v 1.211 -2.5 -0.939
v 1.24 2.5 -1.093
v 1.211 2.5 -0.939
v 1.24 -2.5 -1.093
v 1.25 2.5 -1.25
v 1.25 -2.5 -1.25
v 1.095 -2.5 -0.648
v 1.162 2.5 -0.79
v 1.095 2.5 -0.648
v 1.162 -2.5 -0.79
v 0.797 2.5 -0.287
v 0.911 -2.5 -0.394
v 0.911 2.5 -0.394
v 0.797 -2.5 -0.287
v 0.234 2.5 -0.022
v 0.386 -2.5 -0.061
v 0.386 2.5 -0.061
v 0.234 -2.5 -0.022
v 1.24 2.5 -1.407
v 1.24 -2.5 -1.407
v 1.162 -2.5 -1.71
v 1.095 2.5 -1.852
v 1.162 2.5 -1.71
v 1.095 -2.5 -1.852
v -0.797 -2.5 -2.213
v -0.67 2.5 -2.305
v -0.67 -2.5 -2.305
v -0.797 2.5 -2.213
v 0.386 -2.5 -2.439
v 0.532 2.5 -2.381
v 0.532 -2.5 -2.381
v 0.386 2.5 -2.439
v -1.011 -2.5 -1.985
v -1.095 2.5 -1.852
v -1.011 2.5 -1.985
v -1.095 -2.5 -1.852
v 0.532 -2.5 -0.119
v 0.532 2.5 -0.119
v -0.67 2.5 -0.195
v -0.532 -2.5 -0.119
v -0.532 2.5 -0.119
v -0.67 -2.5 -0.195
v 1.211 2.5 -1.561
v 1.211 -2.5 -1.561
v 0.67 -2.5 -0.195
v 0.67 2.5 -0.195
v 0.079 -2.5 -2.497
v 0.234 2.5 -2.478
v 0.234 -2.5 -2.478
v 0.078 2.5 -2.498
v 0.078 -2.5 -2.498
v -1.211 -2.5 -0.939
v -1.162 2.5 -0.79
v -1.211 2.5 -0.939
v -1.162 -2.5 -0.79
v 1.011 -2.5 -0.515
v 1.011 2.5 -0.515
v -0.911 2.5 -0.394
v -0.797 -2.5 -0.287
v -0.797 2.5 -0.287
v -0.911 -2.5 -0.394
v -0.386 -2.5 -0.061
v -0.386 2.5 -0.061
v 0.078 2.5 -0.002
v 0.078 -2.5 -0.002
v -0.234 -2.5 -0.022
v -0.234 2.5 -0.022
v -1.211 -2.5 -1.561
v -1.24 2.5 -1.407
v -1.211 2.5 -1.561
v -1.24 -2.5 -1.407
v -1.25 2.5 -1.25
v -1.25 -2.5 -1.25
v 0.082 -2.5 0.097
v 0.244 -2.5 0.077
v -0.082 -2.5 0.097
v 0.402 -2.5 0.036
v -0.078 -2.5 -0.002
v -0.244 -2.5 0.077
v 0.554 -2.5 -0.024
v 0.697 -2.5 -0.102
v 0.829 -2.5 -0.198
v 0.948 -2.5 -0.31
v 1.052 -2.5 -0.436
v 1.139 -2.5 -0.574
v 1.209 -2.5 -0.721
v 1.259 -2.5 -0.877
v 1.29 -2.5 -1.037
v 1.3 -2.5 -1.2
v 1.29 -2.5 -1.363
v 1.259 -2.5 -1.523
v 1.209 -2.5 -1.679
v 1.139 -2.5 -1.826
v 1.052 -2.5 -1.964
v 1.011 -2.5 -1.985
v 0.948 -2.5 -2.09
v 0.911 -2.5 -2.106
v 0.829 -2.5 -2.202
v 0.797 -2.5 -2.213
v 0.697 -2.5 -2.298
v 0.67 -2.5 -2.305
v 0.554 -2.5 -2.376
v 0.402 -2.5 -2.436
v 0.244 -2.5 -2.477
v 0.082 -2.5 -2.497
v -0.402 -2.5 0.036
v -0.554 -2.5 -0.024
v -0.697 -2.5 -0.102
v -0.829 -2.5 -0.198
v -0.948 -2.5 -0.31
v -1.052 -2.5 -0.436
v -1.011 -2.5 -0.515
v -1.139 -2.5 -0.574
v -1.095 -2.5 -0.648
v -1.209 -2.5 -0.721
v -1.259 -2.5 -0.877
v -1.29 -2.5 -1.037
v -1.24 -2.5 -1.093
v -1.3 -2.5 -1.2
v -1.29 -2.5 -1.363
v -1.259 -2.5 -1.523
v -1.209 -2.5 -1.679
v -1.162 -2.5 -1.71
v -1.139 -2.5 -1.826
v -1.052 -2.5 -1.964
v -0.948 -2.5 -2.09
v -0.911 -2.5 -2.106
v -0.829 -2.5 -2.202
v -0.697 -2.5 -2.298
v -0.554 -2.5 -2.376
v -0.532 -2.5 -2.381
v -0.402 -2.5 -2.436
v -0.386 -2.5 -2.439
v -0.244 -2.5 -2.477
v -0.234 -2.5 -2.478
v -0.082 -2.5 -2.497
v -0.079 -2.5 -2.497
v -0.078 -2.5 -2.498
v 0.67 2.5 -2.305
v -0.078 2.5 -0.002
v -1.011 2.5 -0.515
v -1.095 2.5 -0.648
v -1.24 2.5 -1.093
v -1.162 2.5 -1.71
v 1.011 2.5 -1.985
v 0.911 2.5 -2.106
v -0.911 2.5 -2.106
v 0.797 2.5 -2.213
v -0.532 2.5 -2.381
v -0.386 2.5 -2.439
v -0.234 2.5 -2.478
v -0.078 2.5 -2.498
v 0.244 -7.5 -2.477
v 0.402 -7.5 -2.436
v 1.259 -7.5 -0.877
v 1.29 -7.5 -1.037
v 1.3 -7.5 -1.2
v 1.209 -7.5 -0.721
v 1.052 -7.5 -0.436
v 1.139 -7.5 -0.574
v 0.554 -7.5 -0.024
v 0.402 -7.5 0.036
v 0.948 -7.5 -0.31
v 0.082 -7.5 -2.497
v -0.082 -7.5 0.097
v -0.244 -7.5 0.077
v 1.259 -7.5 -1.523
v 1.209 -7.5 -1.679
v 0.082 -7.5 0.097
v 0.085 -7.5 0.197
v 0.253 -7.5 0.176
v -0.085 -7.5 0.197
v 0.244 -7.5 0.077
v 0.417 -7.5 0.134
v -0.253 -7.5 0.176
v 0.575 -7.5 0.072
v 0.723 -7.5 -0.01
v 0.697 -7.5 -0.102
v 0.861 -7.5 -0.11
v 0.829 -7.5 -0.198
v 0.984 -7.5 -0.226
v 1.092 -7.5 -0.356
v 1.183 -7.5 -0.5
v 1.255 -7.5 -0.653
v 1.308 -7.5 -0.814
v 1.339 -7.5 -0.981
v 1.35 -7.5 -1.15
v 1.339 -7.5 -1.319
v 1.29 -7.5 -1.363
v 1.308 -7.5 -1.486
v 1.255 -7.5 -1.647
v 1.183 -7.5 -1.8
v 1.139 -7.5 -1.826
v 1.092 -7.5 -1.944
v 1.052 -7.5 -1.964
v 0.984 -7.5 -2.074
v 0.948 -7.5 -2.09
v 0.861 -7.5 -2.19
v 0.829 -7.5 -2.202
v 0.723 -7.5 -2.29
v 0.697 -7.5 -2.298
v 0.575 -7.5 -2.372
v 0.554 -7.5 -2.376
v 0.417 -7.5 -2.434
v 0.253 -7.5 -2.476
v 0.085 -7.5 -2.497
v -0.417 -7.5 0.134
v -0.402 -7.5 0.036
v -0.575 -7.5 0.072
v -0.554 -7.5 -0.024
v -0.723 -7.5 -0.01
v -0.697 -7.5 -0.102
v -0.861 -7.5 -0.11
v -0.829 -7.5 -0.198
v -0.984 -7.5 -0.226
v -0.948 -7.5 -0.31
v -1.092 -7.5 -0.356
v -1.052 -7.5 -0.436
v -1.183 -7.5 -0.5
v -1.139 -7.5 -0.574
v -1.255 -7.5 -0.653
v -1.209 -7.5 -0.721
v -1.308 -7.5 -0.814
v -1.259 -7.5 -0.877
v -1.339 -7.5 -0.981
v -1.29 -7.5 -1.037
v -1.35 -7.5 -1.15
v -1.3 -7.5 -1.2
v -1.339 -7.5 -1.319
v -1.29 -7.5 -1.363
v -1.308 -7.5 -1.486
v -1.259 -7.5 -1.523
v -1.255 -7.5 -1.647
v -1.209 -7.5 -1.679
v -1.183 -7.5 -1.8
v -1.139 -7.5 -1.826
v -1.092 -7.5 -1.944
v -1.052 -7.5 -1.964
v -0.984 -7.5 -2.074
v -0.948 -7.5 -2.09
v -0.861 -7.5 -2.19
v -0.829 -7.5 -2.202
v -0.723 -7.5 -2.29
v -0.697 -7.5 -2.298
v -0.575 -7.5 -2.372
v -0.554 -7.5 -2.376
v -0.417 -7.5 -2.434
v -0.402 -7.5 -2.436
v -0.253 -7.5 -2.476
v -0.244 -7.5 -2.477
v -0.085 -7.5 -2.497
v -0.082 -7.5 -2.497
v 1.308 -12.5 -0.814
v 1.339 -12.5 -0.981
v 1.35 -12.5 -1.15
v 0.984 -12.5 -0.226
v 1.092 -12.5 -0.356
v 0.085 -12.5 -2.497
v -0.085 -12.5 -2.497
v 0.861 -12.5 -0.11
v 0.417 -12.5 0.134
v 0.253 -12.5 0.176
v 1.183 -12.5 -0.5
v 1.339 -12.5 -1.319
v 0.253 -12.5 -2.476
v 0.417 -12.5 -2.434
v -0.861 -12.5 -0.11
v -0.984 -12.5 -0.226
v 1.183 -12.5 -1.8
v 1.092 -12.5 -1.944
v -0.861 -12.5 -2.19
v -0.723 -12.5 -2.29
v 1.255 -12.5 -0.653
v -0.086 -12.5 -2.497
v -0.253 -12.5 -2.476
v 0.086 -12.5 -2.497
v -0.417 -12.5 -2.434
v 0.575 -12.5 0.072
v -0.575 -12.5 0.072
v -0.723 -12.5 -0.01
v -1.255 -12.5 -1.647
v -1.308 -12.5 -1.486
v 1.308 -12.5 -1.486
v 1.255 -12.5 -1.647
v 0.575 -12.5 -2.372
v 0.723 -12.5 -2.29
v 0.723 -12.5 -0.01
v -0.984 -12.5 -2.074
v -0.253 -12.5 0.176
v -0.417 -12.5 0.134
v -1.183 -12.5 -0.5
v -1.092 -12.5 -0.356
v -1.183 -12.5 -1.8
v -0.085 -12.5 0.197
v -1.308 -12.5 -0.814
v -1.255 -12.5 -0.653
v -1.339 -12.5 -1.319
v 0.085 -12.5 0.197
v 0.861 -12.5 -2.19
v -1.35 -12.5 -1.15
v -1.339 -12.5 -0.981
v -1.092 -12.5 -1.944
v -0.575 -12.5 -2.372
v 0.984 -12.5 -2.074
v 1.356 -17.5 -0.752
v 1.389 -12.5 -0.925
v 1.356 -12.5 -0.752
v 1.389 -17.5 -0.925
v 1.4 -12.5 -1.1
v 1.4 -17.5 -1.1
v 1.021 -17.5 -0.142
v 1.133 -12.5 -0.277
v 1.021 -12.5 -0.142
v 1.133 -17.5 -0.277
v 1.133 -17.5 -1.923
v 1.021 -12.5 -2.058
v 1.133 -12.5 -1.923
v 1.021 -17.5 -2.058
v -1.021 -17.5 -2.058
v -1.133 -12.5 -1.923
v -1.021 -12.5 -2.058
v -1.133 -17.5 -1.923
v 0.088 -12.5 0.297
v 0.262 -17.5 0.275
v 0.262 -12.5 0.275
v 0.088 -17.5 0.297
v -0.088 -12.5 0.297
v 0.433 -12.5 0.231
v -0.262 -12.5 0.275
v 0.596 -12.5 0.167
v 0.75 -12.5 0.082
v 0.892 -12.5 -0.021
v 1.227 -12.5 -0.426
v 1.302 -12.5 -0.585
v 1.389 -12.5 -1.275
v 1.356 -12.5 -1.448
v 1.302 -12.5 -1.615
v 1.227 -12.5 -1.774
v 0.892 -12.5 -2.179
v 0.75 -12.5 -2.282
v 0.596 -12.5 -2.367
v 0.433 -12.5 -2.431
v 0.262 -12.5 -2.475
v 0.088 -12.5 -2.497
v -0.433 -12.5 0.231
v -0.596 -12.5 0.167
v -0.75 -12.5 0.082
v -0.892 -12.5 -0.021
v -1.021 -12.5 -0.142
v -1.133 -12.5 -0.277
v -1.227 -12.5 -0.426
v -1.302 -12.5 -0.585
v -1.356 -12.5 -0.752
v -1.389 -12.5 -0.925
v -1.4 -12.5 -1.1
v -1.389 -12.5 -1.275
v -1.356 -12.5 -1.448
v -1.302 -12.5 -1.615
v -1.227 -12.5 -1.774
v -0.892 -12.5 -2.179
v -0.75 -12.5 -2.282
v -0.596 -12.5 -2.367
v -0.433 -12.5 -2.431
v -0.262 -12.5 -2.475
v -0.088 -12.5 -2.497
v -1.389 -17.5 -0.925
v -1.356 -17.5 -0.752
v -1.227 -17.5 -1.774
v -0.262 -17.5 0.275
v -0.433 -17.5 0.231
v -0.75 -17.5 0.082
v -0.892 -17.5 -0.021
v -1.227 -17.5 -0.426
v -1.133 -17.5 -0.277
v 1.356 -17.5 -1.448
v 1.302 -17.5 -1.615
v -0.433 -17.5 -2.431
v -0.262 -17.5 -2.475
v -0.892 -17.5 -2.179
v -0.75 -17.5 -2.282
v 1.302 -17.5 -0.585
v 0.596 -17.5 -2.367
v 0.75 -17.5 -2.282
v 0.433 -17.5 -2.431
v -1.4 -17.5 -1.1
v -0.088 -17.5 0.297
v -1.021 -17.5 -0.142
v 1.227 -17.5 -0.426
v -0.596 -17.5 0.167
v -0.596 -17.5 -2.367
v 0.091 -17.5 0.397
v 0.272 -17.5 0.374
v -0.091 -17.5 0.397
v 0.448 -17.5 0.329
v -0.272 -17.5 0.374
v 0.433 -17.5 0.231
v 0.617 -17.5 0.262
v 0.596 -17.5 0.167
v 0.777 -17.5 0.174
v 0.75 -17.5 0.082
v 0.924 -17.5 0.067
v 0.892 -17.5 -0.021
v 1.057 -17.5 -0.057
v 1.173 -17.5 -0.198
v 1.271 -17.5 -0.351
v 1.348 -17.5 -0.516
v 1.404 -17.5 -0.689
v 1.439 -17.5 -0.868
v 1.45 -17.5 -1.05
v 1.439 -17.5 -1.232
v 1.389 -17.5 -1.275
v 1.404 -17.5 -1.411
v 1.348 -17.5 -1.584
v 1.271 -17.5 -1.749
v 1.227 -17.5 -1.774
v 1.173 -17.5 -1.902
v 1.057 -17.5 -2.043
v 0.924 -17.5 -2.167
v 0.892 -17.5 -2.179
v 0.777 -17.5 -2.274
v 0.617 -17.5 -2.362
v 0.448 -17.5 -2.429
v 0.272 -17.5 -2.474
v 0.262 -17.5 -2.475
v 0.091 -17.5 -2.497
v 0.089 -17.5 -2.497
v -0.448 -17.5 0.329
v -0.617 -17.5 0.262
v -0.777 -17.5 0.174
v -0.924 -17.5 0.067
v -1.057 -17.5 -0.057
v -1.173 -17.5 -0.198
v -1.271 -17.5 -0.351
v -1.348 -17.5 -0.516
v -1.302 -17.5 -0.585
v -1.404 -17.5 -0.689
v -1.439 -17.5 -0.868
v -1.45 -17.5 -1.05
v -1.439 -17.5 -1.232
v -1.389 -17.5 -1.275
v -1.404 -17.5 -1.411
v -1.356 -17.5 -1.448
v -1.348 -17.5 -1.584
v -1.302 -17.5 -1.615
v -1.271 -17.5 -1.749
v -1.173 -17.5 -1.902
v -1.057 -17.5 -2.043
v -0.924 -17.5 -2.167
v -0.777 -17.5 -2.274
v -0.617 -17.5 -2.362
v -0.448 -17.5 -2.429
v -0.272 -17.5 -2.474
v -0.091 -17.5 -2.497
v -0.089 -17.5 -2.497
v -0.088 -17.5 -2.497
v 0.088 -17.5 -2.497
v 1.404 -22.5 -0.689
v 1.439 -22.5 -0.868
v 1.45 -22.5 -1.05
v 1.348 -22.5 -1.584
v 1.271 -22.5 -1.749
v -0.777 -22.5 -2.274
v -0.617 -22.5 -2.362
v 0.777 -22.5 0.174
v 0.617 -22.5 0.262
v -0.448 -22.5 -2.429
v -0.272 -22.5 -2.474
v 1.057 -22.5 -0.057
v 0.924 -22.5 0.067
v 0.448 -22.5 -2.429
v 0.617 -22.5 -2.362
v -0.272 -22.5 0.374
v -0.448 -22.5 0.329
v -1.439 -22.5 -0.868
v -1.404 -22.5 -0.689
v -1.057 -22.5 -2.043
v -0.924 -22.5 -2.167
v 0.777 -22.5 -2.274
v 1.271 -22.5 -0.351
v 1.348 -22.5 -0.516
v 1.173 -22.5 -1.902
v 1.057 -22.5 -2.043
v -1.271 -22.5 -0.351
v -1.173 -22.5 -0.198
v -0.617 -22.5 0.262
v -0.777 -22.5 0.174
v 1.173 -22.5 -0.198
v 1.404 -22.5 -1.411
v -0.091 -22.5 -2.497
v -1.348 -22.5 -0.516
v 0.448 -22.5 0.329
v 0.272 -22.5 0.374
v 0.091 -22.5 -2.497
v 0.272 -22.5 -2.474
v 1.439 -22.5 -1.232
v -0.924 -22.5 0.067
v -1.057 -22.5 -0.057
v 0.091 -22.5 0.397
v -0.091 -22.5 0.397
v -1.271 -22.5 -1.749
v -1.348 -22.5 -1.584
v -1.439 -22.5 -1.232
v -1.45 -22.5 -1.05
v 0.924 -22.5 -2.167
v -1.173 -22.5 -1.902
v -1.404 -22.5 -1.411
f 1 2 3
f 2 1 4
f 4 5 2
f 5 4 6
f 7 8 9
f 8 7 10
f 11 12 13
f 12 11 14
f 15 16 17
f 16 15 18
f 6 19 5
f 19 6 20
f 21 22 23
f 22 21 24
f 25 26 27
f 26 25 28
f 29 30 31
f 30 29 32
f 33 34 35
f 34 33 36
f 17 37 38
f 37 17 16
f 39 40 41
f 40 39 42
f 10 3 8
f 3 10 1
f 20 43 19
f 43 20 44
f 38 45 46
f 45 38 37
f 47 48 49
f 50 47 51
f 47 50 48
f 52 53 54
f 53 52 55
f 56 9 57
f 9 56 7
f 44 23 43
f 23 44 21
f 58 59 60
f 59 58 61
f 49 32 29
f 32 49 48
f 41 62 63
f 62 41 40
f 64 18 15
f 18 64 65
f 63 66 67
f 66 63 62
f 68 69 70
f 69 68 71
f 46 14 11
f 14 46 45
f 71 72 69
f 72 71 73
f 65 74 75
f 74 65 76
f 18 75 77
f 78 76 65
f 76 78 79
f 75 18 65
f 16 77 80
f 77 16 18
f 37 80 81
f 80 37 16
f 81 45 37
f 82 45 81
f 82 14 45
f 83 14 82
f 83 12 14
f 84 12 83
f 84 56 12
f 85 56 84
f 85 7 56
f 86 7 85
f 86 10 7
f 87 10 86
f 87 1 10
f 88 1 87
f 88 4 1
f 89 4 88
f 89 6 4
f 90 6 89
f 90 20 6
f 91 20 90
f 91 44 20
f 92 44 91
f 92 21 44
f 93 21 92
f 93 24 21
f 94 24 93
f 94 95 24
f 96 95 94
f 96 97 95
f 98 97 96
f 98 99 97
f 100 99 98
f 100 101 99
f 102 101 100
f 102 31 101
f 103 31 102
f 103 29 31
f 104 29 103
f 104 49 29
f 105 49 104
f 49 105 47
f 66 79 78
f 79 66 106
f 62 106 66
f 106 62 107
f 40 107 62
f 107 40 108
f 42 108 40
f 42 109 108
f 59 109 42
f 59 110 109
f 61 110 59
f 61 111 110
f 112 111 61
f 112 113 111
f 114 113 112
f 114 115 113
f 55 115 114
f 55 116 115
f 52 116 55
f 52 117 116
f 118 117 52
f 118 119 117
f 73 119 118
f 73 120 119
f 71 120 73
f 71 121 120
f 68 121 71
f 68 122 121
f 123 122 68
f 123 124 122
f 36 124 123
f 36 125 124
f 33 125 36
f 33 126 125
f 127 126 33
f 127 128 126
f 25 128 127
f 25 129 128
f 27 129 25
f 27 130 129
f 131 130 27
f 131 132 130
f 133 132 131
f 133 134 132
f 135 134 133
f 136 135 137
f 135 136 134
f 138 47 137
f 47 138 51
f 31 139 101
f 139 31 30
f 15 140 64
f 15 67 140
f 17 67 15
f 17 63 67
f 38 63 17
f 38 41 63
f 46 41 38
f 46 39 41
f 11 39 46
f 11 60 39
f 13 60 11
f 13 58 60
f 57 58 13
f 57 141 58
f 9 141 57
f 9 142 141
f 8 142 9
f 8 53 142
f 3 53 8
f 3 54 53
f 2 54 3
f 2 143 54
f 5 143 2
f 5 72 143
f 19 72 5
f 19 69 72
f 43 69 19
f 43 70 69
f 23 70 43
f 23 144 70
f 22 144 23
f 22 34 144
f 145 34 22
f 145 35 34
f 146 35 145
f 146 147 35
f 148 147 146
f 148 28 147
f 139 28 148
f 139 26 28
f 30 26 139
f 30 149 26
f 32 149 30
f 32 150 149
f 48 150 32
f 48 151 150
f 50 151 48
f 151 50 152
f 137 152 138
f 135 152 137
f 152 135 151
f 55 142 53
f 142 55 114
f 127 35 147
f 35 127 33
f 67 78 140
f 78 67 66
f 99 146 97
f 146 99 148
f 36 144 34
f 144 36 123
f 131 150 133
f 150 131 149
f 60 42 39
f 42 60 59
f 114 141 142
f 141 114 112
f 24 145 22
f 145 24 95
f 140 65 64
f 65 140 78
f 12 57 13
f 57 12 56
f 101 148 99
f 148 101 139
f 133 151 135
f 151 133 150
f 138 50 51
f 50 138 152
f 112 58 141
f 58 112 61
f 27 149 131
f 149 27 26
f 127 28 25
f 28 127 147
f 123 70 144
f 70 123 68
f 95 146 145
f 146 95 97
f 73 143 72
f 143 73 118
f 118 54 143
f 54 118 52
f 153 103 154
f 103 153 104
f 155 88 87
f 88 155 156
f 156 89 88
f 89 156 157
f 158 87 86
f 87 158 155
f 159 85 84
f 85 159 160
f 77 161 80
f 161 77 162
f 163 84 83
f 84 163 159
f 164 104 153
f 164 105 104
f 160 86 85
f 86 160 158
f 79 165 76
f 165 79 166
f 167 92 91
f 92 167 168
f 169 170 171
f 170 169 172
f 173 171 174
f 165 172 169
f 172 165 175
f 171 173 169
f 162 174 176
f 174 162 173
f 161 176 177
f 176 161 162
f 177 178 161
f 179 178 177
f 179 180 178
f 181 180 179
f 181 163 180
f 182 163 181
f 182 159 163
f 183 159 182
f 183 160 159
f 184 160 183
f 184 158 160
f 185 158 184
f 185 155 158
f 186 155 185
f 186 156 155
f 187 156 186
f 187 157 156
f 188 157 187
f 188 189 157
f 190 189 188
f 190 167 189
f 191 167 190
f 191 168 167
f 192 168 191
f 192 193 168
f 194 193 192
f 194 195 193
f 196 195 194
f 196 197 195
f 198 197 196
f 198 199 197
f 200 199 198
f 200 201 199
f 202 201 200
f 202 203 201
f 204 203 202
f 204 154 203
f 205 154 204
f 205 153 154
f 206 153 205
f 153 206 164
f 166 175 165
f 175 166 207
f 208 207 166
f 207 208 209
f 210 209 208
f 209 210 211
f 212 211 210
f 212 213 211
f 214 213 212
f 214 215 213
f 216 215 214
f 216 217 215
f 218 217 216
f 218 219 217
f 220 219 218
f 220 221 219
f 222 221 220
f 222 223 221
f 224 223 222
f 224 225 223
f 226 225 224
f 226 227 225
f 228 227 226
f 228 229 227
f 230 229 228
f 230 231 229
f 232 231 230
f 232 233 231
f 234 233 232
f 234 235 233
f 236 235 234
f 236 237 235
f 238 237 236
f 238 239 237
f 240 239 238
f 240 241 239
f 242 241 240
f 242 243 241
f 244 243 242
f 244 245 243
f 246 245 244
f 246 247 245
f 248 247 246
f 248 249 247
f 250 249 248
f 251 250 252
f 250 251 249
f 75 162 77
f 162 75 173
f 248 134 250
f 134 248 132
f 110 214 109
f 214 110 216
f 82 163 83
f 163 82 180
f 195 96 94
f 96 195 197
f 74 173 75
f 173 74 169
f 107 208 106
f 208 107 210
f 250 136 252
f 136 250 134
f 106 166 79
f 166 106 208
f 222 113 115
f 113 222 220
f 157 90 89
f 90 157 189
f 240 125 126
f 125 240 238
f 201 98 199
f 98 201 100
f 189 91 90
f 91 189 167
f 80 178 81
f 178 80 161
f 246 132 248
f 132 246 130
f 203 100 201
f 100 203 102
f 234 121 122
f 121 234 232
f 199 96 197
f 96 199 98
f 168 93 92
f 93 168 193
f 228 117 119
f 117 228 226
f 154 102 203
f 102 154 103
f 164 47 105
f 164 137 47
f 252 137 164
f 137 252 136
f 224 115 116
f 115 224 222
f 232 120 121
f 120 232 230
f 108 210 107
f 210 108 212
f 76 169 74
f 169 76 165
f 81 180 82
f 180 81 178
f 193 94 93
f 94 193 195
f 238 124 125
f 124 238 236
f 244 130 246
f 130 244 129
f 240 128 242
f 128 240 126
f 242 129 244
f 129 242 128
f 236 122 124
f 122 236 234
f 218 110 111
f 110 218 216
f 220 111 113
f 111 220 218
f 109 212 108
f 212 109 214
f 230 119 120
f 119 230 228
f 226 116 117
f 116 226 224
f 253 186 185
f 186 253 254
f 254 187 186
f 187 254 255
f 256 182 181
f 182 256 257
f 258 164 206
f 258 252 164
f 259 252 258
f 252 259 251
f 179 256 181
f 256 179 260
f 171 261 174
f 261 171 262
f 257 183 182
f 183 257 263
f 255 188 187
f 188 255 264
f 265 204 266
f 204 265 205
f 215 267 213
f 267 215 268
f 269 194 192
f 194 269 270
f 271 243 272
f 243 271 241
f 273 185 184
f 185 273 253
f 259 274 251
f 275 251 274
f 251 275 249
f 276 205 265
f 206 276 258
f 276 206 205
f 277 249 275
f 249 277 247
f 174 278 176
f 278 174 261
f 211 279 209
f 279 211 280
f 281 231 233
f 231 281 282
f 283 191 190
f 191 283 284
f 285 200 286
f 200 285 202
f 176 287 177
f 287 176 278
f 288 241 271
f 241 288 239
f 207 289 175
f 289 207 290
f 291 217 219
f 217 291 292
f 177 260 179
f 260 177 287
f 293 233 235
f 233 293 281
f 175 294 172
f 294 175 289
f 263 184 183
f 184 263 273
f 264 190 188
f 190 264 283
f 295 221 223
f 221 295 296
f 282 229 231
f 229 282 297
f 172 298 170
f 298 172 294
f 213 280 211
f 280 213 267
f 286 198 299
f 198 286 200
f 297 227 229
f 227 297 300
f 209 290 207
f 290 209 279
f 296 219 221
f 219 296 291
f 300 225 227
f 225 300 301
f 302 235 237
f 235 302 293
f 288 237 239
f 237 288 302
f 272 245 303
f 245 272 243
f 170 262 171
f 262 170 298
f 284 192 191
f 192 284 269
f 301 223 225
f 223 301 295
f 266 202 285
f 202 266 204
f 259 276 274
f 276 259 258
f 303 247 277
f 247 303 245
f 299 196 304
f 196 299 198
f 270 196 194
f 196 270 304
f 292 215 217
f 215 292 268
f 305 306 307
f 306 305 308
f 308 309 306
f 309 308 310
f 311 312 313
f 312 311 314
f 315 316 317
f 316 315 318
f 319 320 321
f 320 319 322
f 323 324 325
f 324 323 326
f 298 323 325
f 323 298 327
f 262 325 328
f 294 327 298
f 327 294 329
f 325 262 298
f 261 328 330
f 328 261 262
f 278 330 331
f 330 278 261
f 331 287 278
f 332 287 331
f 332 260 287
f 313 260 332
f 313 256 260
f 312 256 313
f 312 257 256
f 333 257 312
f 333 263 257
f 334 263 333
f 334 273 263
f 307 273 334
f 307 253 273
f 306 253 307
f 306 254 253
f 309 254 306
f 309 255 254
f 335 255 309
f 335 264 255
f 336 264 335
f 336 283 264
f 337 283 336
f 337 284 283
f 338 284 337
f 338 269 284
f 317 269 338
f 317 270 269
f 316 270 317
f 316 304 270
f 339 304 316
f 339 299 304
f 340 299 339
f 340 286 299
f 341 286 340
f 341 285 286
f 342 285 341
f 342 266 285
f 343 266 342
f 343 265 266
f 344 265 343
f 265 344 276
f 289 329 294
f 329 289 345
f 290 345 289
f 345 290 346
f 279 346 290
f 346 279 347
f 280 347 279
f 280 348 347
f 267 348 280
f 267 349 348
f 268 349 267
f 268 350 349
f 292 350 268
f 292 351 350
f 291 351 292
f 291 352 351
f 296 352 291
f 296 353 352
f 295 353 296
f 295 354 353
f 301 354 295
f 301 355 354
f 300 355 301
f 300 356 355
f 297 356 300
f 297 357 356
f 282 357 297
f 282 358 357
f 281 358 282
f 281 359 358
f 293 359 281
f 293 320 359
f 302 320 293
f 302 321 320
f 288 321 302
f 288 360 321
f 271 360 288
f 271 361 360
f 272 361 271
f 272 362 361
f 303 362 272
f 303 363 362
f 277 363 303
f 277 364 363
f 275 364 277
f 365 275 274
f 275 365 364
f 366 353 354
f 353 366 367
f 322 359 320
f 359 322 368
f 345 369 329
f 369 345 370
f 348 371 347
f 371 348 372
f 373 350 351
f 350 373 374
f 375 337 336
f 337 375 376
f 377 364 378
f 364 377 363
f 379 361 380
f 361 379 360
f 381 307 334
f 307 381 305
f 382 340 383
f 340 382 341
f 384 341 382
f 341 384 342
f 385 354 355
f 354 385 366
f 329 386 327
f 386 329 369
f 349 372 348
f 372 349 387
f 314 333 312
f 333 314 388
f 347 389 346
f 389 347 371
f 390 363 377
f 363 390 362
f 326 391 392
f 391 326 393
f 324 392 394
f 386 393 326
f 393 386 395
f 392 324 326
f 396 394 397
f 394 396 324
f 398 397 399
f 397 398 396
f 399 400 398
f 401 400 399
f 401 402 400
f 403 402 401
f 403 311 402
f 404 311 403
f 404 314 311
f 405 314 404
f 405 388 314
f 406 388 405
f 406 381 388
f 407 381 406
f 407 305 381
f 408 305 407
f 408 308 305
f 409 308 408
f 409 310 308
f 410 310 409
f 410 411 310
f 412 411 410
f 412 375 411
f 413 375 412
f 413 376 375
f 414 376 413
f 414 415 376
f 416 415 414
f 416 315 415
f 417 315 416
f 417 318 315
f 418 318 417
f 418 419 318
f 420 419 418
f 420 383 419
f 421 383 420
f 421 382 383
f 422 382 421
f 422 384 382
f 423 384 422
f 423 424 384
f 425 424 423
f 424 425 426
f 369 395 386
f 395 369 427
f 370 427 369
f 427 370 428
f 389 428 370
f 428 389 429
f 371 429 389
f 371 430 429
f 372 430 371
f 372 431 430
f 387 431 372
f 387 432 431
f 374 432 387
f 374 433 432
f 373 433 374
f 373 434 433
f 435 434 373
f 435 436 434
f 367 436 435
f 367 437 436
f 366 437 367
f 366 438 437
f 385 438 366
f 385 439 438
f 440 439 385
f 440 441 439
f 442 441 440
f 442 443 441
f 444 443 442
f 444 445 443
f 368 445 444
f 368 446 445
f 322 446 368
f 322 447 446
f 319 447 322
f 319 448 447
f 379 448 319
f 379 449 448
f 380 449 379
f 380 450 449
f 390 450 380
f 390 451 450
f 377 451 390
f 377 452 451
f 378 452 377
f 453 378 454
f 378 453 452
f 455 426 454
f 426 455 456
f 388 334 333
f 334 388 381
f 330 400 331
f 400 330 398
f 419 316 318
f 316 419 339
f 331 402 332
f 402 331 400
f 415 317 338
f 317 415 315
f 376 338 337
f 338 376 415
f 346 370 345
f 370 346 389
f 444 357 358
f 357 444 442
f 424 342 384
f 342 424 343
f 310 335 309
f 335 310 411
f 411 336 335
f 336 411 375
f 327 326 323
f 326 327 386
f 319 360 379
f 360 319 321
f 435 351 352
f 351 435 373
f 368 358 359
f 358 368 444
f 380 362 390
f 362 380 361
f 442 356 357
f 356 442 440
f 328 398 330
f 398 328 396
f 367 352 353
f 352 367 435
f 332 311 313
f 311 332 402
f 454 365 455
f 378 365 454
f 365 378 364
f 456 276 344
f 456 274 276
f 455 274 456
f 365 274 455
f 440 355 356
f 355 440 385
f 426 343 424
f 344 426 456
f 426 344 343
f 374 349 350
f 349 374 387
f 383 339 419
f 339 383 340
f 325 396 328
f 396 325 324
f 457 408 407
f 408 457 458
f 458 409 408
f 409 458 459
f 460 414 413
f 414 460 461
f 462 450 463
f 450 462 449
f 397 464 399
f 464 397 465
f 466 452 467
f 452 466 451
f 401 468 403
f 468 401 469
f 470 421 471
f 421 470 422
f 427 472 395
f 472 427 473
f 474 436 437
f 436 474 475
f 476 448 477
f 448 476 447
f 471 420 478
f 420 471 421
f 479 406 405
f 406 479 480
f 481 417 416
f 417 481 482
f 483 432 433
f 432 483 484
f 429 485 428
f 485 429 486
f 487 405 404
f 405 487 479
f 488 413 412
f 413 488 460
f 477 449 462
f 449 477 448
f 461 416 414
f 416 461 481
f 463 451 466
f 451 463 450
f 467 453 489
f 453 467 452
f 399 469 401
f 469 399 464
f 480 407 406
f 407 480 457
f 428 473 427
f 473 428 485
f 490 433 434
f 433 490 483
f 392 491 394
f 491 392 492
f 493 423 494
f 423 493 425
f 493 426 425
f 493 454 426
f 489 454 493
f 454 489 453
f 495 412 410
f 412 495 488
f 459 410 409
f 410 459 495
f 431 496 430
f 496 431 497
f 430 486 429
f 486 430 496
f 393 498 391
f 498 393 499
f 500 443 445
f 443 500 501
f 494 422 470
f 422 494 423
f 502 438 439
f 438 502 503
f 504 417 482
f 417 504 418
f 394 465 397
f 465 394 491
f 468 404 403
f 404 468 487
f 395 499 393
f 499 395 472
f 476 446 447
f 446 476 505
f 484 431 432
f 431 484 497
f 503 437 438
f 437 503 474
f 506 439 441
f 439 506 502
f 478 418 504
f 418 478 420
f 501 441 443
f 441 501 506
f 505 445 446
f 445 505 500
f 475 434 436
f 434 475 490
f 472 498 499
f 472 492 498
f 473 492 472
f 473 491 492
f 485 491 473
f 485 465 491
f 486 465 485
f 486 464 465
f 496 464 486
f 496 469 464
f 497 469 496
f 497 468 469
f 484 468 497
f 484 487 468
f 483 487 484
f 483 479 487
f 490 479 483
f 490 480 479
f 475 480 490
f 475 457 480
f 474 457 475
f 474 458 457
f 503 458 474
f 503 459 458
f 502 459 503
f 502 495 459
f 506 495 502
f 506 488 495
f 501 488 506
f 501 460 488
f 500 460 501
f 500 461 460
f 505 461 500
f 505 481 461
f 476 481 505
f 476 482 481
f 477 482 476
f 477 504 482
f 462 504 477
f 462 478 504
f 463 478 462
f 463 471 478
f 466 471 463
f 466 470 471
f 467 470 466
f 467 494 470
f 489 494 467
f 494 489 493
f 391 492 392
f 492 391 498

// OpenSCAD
$fn=50;

rotate([90,0,0])
for (i=[2.5,2.6,2.7,2.8,2.9]){
    translate([0,(i/2)-2.5,50*(i-2.5)])
        cylinder(d=i, h=5, center=true);
}

//cylinder(d=3, h=30, center=true);
//translate([0,0,14]) cylinder(d=2.8, h=10, center=true);
